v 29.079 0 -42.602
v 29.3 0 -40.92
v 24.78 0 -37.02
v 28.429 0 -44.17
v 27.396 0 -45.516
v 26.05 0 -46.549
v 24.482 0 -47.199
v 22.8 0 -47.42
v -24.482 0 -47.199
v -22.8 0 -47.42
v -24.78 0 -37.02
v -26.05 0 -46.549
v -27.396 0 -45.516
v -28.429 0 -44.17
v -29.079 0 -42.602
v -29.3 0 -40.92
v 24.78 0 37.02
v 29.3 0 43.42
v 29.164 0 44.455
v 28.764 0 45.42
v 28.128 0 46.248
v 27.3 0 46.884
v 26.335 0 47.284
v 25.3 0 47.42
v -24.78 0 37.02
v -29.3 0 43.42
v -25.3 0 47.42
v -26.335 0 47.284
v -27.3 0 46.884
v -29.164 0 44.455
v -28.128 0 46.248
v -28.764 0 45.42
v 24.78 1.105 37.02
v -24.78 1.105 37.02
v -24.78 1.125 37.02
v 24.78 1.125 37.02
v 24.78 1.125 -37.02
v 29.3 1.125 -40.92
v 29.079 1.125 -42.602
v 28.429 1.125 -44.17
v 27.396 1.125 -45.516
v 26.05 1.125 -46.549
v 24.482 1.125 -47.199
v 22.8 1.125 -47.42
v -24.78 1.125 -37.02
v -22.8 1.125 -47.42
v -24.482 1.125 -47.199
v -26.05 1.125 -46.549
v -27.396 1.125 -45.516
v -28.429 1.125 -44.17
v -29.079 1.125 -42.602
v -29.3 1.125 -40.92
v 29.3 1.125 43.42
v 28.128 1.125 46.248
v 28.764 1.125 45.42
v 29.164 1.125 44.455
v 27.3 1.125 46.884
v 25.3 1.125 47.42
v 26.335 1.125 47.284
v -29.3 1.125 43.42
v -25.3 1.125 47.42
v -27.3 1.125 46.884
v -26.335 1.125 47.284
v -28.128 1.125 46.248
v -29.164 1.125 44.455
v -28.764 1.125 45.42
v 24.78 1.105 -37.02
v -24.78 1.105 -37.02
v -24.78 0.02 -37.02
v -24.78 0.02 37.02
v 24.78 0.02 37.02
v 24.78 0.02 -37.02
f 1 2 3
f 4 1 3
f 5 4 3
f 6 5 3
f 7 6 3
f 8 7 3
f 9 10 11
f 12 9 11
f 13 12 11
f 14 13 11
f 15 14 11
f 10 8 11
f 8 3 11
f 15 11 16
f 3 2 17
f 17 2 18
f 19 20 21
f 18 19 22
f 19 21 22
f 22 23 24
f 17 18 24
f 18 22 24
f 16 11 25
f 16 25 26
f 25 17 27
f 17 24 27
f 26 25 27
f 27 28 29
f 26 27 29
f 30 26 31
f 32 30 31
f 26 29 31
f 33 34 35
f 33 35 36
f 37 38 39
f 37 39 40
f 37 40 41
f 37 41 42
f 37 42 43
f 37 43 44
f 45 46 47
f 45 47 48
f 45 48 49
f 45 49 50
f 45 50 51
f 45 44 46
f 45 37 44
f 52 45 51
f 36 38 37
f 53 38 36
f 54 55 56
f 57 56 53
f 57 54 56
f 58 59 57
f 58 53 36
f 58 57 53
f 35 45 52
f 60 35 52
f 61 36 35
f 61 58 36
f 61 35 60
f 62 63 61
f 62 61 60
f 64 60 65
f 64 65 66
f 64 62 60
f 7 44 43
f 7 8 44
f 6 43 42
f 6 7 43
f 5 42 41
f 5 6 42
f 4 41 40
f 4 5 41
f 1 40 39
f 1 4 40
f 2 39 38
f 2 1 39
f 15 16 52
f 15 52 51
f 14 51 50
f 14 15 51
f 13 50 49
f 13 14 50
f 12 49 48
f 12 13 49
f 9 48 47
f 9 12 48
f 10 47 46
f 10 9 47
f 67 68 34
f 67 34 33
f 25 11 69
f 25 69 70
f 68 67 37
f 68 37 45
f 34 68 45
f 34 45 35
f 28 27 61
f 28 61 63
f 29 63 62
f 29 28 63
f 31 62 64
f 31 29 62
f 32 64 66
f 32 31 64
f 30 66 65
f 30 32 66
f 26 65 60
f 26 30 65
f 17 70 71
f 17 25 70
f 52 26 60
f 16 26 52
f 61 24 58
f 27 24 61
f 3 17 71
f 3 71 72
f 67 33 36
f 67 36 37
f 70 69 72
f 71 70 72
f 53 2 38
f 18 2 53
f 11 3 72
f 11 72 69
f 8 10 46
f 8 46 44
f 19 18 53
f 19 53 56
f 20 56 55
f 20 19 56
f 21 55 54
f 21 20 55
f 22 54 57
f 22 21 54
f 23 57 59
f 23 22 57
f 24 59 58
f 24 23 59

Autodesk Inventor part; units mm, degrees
ref_plane "YZ Plane" through (0, 0, 0) normal (1, 0, 0) x (0, 1, 0)
sketch "Sketch2" plane through (0, 0, 0) normal (0, 1, 0) x (-1, 0, 0)
  line L0 (-25.3, 47.42) -> (25.3, 47.42)
  line L1 (29.3, 43.42) -> (29.3, -40.92)
  line L2 (22.8, -47.42) -> (-22.8, -47.42)
  line L3 (-29.3, -40.92) -> (-29.3, 43.42)
  arc A0 (-25.3, 47.42) -> (-29.3, 43.42) centre (-25.3, 43.42) ccw
  arc A1 (29.3, 43.42) -> (25.3, 47.42) centre (25.3, 43.42) ccw
  arc A2 (22.8, -47.42) -> (29.3, -40.92) centre (22.8, -40.92) ccw
  arc A3 (-29.3, -40.92) -> (-22.8, -47.42) centre (-22.8, -40.92) ccw
  point P0 (0, 0)
  point P1 (-29.3, 47.42)
  point P2 (29.3, -47.42)
  point P3 (29.3, 47.42)
  dimension "d6" = 94.84
  dimension "d7" = 58.6
  dimension "d8" = 29.3
  dimension "d9" = 47.42
  dimension "d23" = 4
  dimension "d24" = 4
  dimension "d25" = 6.5
  dimension "d26" = 6.5
extrude "Extrusion2" add sketch "Sketch2" along normal blind 1.125
sketch "Sketch1" plane through (0, 0, 0) normal (0, 1, 0) x (-1, 0, 0)
  line L0 (24.78, 37.02) -> (-24.78, 37.02)
  line L1 (-24.78, 37.02) -> (-24.78, -37.02)
  line L2 (-24.78, -37.02) -> (24.78, -37.02)
  line L3 (24.78, -37.02) -> (24.78, 37.02)
  point P0 (0, 0)
  dimension "d0" = 49.56
  dimension "d1" = 74.04
  dimension "d2" = 37.02
  dimension "d3" = 24.78
extrude "Extrusion1" cut sketch "Sketch1" along normal blind 1.3
ref_plane "Work Plane1" through (0, 0.02, 0) normal (0, -1, 0) x (1, 0, 0)
ref_plane "Work Plane2" through (0, 1.105, 0) normal (0, 1, 0) x (1, 0, 0)
sketch "Sketch4" plane through (0, 1.105, 0) normal (0, 1, 0) x (1, 0, 0)
  line L0 (-24.78, -37.02) -> (-24.78, 37.02) projected
  line L1 (24.78, -37.02) -> (-24.78, -37.02) projected
  line L2 (24.78, 37.02) -> (24.78, -37.02) projected
  line L3 (-24.78, 37.02) -> (24.78, 37.02) projected
  line L4 (-24.78, -37.02) -> (-24.78, 37.02) projected
  line L5 (-24.78, 37.02) -> (24.78, 37.02) projected
  line L6 (24.78, 37.02) -> (24.78, -37.02) projected
  line L7 (24.78, -37.02) -> (-24.78, -37.02) projected
  line L8 (29.3, -43.42) -> (29.3, 40.92) projected
  arc A0 (29.3, 40.92) -> (22.8, 47.42) centre (22.8, 40.92) ccw projected
  line L9 (22.8, 47.42) -> (-22.8, 47.42) projected
  arc A1 (-22.8, 47.42) -> (-29.3, 40.92) centre (-22.8, 40.92) ccw projected
  line L10 (-29.3, 40.92) -> (-29.3, -43.42) projected
  arc A2 (-29.3, -43.42) -> (-25.3, -47.42) centre (-25.3, -43.42) ccw projected
  line L11 (-25.3, -47.42) -> (25.3, -47.42) projected
  arc A3 (25.3, -47.42) -> (29.3, -43.42) centre (25.3, -43.42) ccw projected
  line L12 (-24.78, -37.02) -> (24.78, -37.02) projected
  line L13 (-24.78, -37.02) -> (24.78, -37.02)
  line L14 (24.78, -37.02) -> (24.78, 37.02)
  line L15 (24.78, 37.02) -> (-24.78, 37.02)
  line L16 (-24.78, 37.02) -> (-24.78, -37.02)
  point P0 (0, 0)
extrude "Extrusion4" add sketch "Sketch4" along normal up to surface (1.085 mm away) from surface at -1.085 contours L0 L3 L2 L1
equation "\"d8\" = 0.5 * d7"
equation "\"d9\" = 0.5 * d6"
equation "\"d24\" = d23"
equation "\"d26\" = d25"
equation "\"d2\" = 0.5 * d1"
equation "\"d3\" = 0.5 * d0"
properties part number "Touchcreen+Cover"
